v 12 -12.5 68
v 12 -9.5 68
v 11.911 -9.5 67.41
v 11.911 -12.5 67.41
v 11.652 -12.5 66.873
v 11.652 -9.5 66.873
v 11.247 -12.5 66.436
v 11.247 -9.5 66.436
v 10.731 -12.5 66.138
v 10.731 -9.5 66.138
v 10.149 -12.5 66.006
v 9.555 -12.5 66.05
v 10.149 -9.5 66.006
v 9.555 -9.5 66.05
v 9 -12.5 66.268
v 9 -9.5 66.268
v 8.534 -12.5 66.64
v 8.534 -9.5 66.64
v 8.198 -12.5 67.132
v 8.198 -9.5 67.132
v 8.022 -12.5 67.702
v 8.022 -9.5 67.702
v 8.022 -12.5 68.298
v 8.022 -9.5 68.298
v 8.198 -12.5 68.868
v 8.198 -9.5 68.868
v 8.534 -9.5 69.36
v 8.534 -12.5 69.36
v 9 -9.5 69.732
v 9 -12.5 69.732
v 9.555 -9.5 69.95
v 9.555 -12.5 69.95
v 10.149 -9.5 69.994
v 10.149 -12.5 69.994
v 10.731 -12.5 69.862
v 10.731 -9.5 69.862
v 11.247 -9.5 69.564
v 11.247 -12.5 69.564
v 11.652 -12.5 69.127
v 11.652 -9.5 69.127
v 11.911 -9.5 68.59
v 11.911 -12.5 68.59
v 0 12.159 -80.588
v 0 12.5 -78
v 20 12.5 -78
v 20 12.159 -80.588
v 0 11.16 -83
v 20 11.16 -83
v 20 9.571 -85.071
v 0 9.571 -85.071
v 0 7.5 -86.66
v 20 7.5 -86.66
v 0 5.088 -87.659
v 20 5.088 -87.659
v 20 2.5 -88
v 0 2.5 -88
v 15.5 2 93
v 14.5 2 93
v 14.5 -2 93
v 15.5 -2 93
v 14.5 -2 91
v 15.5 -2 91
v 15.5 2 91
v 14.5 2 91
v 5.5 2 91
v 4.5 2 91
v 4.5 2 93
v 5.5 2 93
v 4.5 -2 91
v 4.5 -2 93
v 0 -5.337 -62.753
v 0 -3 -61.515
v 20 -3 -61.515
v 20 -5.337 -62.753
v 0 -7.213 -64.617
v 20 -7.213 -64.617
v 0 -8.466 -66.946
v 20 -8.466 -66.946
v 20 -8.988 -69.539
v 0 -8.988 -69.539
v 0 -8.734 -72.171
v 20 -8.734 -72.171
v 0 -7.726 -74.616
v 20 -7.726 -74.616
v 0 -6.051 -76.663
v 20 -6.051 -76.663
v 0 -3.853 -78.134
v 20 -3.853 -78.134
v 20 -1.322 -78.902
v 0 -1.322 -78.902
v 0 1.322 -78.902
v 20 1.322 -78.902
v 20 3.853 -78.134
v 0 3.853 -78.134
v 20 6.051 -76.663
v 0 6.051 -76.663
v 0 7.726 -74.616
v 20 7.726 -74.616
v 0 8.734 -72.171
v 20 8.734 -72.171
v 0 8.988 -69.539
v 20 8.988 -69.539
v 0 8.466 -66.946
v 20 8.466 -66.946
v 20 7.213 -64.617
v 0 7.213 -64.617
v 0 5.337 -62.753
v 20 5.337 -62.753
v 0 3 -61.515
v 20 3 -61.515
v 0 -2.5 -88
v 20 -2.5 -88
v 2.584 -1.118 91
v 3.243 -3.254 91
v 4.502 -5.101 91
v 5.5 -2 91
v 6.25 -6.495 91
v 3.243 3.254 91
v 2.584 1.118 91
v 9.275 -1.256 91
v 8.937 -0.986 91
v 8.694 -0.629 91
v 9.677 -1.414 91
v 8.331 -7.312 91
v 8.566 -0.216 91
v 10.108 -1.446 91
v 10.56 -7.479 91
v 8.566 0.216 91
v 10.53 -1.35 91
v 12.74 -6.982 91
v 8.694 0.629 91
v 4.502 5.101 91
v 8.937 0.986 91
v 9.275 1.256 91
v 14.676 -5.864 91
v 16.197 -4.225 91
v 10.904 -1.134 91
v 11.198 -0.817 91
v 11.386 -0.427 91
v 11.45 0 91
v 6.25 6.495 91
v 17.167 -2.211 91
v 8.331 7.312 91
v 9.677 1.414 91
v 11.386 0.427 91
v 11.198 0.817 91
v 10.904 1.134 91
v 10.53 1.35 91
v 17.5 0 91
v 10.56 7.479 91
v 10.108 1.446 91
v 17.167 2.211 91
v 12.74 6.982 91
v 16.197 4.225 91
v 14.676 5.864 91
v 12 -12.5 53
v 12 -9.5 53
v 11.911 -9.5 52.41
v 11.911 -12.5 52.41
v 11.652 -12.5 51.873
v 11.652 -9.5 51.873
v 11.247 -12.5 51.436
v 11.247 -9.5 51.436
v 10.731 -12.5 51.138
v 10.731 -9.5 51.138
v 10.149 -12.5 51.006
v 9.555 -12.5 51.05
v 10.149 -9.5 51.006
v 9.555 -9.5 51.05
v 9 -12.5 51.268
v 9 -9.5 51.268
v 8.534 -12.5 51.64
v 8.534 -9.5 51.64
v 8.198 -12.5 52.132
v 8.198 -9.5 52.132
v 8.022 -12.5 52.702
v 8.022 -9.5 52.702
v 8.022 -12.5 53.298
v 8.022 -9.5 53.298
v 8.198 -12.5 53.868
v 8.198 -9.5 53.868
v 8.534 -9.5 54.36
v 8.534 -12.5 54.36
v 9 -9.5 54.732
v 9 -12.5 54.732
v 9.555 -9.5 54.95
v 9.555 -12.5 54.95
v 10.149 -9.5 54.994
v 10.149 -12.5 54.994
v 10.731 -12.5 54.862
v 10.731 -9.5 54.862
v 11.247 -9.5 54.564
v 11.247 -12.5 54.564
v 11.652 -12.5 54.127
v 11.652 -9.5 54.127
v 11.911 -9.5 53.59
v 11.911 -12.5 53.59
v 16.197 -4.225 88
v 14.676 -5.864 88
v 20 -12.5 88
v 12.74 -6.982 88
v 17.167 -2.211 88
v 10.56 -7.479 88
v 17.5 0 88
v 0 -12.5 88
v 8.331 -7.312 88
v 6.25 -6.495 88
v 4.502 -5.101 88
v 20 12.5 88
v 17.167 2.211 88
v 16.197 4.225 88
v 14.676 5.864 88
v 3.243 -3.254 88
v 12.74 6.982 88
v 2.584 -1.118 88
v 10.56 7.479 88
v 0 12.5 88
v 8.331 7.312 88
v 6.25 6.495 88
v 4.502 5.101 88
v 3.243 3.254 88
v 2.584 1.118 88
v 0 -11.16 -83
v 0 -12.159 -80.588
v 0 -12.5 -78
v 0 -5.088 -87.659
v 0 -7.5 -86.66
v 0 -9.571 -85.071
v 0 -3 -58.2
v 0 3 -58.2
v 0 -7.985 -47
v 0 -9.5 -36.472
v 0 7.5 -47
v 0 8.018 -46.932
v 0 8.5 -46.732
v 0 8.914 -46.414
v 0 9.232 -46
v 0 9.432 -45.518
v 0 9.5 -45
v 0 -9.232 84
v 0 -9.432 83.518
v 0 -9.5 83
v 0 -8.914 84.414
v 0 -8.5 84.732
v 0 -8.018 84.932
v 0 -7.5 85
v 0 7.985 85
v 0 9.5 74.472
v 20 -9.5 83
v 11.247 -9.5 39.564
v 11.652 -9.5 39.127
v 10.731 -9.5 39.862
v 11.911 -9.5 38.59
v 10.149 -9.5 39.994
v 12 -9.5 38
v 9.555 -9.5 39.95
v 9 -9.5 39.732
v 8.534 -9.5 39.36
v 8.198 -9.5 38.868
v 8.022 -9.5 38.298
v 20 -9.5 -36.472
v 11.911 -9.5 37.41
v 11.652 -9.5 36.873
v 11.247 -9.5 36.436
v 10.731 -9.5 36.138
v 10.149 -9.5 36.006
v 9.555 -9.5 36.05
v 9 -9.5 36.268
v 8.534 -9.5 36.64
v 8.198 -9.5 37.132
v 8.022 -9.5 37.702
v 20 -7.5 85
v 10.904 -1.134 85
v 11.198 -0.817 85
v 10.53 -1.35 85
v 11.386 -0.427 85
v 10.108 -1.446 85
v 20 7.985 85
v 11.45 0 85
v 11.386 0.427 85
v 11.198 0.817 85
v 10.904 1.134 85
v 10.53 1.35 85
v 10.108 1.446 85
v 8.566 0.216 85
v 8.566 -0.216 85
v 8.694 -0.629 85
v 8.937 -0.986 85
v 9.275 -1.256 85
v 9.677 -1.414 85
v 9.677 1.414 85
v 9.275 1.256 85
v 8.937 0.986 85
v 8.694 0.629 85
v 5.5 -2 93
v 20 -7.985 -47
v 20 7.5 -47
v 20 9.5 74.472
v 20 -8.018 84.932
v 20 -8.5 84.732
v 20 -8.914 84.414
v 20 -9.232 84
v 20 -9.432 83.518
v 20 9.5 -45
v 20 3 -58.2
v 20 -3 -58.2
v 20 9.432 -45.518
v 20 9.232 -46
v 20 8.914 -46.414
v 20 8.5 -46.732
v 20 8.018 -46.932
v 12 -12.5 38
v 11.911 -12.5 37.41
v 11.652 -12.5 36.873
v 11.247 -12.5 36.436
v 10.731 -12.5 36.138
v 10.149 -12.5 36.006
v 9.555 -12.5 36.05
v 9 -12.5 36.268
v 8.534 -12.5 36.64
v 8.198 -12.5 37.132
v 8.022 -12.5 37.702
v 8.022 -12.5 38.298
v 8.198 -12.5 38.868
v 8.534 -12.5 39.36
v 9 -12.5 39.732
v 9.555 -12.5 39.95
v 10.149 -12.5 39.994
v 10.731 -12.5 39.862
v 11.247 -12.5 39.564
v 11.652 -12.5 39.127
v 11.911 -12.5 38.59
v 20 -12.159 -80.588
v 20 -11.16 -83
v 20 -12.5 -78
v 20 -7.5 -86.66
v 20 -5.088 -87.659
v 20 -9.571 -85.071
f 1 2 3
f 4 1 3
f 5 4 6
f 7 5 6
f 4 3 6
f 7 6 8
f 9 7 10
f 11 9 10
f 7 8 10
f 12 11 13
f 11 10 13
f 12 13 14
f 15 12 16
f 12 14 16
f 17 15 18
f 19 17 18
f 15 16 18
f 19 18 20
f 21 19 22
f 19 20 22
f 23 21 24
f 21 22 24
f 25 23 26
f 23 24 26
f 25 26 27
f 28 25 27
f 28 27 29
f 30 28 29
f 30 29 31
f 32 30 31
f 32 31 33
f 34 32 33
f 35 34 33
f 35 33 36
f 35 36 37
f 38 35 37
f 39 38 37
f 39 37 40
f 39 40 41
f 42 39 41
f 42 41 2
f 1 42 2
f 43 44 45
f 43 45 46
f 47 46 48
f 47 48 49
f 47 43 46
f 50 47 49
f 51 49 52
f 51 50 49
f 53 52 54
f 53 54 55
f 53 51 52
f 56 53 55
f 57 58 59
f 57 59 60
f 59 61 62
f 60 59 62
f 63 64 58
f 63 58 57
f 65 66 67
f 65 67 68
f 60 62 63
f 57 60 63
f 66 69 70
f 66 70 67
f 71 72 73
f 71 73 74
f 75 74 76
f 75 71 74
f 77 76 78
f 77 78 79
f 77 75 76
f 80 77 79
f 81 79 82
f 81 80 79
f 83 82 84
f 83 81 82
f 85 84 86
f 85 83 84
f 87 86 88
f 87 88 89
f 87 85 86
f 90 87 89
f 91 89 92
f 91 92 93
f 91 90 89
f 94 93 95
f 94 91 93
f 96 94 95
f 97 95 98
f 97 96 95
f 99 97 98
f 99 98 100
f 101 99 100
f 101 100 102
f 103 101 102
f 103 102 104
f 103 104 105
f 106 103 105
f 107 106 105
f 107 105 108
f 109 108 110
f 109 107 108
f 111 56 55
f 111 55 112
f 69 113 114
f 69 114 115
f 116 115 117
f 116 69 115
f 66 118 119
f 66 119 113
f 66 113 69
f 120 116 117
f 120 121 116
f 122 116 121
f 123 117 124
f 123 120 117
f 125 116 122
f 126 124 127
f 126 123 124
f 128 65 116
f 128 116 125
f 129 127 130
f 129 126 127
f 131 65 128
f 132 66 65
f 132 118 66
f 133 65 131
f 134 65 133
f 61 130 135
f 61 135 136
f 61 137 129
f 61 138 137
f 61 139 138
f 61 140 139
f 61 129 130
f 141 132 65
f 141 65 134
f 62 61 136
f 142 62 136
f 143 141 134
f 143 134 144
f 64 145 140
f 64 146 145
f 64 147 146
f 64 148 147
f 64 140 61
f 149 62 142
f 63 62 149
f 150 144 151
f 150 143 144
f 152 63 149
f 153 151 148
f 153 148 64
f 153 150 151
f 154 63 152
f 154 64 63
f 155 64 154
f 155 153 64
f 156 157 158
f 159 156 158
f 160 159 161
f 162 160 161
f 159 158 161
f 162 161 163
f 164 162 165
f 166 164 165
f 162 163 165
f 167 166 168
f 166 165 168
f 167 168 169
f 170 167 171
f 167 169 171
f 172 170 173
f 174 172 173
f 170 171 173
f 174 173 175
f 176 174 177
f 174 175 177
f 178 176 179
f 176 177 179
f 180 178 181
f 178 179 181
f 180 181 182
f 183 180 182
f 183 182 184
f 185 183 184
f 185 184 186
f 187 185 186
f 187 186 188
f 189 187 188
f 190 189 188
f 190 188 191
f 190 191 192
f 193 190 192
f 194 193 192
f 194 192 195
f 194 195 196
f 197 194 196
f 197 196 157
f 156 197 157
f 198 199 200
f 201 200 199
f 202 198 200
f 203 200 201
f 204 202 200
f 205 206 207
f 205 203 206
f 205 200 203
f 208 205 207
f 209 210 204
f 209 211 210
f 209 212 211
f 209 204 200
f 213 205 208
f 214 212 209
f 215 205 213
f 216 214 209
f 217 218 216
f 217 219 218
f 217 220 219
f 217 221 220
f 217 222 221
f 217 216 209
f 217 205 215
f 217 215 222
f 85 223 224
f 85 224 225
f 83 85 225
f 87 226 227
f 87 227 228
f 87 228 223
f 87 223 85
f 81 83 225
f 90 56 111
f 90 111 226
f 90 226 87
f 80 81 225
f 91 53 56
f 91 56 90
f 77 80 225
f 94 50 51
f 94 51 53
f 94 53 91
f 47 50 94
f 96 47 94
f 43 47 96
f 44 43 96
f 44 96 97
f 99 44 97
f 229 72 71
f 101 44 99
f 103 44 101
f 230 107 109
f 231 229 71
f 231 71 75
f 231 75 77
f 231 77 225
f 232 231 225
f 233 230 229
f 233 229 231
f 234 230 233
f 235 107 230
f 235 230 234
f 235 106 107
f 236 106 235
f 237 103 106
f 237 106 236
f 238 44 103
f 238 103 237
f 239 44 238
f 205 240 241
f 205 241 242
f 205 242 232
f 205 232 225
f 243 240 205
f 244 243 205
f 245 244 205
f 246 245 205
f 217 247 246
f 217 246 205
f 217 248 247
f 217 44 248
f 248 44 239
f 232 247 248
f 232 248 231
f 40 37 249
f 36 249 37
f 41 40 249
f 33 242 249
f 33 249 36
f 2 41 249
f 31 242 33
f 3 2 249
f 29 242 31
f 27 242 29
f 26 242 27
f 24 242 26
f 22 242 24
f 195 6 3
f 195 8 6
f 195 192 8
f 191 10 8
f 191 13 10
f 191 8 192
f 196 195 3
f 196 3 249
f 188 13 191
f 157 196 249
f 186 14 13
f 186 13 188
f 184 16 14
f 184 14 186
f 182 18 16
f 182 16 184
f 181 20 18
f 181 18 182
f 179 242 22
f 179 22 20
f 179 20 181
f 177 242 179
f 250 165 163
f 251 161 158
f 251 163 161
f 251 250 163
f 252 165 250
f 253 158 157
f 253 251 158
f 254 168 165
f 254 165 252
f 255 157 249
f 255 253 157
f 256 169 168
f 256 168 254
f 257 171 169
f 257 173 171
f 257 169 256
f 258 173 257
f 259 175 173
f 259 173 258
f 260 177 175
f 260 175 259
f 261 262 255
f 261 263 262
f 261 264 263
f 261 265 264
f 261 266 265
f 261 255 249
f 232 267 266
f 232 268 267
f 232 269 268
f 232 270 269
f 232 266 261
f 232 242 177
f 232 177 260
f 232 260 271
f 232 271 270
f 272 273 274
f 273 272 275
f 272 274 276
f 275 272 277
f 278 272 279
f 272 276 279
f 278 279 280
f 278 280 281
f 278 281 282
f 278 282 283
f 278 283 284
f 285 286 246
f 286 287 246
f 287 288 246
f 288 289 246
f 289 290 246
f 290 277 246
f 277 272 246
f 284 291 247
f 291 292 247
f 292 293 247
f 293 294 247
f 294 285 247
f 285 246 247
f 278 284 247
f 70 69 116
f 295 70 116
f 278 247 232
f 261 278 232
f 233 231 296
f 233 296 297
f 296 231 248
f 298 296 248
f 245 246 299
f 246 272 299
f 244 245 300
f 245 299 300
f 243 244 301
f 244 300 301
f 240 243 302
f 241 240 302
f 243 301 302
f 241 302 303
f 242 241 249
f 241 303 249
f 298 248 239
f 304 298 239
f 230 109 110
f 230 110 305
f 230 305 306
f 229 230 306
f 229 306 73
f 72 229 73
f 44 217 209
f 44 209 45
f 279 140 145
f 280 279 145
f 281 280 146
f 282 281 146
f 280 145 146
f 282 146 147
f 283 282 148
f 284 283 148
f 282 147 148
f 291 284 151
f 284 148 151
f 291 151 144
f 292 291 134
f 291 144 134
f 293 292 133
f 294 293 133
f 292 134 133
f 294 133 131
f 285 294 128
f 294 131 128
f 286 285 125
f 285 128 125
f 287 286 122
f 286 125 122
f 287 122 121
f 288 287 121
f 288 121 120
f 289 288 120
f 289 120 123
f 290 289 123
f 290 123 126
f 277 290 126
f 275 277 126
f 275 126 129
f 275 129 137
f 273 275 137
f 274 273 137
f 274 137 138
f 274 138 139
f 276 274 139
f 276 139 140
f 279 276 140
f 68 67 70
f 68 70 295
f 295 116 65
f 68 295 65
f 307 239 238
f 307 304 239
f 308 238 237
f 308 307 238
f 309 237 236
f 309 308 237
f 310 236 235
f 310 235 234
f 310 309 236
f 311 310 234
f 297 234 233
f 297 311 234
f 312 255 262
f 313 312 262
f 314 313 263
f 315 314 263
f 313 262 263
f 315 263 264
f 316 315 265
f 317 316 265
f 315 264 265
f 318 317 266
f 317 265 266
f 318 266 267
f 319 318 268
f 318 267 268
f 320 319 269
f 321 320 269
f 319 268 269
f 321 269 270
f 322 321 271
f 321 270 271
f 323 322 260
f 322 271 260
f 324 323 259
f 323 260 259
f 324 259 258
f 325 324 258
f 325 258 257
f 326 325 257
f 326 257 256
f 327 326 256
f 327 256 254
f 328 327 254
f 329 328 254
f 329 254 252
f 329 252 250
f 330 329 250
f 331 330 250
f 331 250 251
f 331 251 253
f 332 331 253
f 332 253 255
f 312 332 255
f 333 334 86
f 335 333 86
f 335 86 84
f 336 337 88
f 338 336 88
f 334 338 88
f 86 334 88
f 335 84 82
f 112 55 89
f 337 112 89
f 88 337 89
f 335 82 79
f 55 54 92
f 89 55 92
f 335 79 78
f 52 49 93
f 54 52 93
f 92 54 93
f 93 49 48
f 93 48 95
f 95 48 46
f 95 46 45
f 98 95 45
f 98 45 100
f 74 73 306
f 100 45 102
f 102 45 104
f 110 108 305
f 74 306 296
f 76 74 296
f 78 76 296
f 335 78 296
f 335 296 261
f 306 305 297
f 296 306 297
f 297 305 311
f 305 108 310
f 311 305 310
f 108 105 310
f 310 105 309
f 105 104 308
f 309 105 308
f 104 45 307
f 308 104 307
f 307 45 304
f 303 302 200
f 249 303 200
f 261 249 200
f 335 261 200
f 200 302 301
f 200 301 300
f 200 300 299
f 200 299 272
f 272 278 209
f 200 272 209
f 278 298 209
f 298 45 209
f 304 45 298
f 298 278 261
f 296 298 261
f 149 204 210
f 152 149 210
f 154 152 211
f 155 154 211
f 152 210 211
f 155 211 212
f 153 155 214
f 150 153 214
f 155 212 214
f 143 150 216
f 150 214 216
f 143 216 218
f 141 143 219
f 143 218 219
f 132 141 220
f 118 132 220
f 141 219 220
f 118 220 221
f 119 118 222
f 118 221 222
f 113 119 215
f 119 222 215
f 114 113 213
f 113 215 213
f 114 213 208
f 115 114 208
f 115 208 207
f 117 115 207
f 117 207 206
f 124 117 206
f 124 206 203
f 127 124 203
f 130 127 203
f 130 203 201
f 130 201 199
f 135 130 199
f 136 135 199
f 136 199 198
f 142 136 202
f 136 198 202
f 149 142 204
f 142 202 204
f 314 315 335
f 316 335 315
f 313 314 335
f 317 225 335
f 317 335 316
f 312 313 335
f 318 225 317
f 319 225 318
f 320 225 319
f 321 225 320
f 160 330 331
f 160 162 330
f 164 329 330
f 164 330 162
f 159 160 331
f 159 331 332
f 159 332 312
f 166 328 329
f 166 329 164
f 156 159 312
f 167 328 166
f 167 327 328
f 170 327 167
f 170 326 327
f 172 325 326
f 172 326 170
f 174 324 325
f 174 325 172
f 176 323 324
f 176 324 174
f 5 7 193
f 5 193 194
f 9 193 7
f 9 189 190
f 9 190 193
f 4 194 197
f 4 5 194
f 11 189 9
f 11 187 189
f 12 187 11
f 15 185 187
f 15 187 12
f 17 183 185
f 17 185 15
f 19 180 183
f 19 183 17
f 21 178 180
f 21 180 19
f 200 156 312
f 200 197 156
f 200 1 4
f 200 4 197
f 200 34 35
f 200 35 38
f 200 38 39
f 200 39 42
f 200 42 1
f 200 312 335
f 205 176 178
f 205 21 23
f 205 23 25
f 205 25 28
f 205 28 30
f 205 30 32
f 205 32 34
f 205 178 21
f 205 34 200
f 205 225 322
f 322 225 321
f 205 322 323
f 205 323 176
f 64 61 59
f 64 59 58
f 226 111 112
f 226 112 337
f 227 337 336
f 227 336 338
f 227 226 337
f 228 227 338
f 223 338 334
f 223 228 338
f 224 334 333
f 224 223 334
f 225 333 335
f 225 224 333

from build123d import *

# Parameters (mm, degrees)
SKETCH2_W           = 132
SKETCH2_H           = 19
BOSS_EXTRUDE1_DEPTH = 20
SKETCH3_R           = 7.5
BOSS_EXTRUDE2_DEPTH = 3
SKETCH4_W           = 1
SKETCH4_H           = 4
BOSS_EXTRUDE3_DEPTH = 2
CUT_EXTRUDE1_REACH  = 181
SKETCH5_R           = 1.45
FILLET1_R           = 2
SKETCH6_R           = 2
CUT_EXTRUDE2_DEPTH  = 10


with BuildPart() as part:
    # Sketch2 → Boss-Extrude1 (new body)
    with BuildSketch(Plane(origin=(0, 0, 0), x_dir=(0, 0, -1), z_dir=(1, 0, 0))):
        with BuildLine():
            Line((88, 2.5), (88, -2.5))
            ThreePointArc((88, -2.5), (85.071067812, -9.571067812), (78, -12.5))
            Line((78, -12.5), (-88, -12.5))
            Line((-88, -12.5), (-88, -9.5))
            Line((-88, -9.5), (-88, 9.5))
            Line((-88, 9.5), (-88, 12.5))
            Line((-88, 12.5), (78, 12.5))
            ThreePointArc((78, 12.5), (85.071067812, 9.571067812), (88, 2.5))
        make_face()
        with BuildLine():
            ThreePointArc((61.514718626, -3), (79, 0), (61.514718626, 3))
            Line((61.514718626, 3), (58.2, 3))
            Line((58.2, 3), (58.2, -3))
            Line((58.2, -3), (61.514718626, -3))
        make_face(mode=Mode.SUBTRACT)
        with Locations((-19, 0)):
            Rectangle(SKETCH2_W, SKETCH2_H, mode=Mode.SUBTRACT)
        Polygon((-85, 7.984540751), (36.47154627, -9.5), (47, -9.5), (47, -7.984540751), (-74.47154627, 9.5), (-85, 9.5), align=None)
    extrude(amount=BOSS_EXTRUDE1_DEPTH)

    # Sketch3 → Boss-Extrude2 (add)
    with BuildSketch(Plane.XY.offset(88)):
        with Locations((10, 0)):
            Circle(SKETCH3_R)
    extrude(amount=BOSS_EXTRUDE2_DEPTH)

    # Sketch4 → Boss-Extrude3 (add)
    with BuildSketch(Plane.XY.offset(91)):
        with Locations((5, 0)):
            Rectangle(SKETCH4_W, SKETCH4_H)
        with Locations((15, 0)):
            Rectangle(SKETCH4_W, SKETCH4_H)
    extrude(amount=BOSS_EXTRUDE3_DEPTH)

    # Sketch5 → Cut-Extrude1 (cut, up to next)
    with BuildSketch(Plane.XY.offset(91), mode=Mode.PRIVATE) as cut_extrude1_sk1:
        with Locations((10, 0)):
            Circle(SKETCH5_R)
    cut_extrude1_tool1 = extrude(cut_extrude1_sk1.sketch, amount=-CUT_EXTRUDE1_REACH, mode=Mode.PRIVATE) & part.part
    add(cut_extrude1_tool1.solids().sort_by_distance((10, 0, 91))[0], mode=Mode.SUBTRACT)

    # Fillet1
    fillet1_edges = [part.edges().sort_by_distance(p)[0] for p in [
        (10, 9.5, -47),
        (10, -9.5, 85),
    ]]
    fillet(fillet1_edges, radius=FILLET1_R)

    # Sketch6 → Cut-Extrude2 (cut)
    with BuildSketch(Plane(origin=(0, -9.5, 0), x_dir=(1, 0, 0), z_dir=(0, 1, 0))):
        with Locations((10, -53)):
            Circle(SKETCH6_R)
        with Locations((10, -68)):
            Circle(SKETCH6_R)
        with Locations((10, -38)):
            Circle(SKETCH6_R)
    extrude(amount=-CUT_EXTRUDE2_DEPTH, mode=Mode.SUBTRACT)


solid = part.part
